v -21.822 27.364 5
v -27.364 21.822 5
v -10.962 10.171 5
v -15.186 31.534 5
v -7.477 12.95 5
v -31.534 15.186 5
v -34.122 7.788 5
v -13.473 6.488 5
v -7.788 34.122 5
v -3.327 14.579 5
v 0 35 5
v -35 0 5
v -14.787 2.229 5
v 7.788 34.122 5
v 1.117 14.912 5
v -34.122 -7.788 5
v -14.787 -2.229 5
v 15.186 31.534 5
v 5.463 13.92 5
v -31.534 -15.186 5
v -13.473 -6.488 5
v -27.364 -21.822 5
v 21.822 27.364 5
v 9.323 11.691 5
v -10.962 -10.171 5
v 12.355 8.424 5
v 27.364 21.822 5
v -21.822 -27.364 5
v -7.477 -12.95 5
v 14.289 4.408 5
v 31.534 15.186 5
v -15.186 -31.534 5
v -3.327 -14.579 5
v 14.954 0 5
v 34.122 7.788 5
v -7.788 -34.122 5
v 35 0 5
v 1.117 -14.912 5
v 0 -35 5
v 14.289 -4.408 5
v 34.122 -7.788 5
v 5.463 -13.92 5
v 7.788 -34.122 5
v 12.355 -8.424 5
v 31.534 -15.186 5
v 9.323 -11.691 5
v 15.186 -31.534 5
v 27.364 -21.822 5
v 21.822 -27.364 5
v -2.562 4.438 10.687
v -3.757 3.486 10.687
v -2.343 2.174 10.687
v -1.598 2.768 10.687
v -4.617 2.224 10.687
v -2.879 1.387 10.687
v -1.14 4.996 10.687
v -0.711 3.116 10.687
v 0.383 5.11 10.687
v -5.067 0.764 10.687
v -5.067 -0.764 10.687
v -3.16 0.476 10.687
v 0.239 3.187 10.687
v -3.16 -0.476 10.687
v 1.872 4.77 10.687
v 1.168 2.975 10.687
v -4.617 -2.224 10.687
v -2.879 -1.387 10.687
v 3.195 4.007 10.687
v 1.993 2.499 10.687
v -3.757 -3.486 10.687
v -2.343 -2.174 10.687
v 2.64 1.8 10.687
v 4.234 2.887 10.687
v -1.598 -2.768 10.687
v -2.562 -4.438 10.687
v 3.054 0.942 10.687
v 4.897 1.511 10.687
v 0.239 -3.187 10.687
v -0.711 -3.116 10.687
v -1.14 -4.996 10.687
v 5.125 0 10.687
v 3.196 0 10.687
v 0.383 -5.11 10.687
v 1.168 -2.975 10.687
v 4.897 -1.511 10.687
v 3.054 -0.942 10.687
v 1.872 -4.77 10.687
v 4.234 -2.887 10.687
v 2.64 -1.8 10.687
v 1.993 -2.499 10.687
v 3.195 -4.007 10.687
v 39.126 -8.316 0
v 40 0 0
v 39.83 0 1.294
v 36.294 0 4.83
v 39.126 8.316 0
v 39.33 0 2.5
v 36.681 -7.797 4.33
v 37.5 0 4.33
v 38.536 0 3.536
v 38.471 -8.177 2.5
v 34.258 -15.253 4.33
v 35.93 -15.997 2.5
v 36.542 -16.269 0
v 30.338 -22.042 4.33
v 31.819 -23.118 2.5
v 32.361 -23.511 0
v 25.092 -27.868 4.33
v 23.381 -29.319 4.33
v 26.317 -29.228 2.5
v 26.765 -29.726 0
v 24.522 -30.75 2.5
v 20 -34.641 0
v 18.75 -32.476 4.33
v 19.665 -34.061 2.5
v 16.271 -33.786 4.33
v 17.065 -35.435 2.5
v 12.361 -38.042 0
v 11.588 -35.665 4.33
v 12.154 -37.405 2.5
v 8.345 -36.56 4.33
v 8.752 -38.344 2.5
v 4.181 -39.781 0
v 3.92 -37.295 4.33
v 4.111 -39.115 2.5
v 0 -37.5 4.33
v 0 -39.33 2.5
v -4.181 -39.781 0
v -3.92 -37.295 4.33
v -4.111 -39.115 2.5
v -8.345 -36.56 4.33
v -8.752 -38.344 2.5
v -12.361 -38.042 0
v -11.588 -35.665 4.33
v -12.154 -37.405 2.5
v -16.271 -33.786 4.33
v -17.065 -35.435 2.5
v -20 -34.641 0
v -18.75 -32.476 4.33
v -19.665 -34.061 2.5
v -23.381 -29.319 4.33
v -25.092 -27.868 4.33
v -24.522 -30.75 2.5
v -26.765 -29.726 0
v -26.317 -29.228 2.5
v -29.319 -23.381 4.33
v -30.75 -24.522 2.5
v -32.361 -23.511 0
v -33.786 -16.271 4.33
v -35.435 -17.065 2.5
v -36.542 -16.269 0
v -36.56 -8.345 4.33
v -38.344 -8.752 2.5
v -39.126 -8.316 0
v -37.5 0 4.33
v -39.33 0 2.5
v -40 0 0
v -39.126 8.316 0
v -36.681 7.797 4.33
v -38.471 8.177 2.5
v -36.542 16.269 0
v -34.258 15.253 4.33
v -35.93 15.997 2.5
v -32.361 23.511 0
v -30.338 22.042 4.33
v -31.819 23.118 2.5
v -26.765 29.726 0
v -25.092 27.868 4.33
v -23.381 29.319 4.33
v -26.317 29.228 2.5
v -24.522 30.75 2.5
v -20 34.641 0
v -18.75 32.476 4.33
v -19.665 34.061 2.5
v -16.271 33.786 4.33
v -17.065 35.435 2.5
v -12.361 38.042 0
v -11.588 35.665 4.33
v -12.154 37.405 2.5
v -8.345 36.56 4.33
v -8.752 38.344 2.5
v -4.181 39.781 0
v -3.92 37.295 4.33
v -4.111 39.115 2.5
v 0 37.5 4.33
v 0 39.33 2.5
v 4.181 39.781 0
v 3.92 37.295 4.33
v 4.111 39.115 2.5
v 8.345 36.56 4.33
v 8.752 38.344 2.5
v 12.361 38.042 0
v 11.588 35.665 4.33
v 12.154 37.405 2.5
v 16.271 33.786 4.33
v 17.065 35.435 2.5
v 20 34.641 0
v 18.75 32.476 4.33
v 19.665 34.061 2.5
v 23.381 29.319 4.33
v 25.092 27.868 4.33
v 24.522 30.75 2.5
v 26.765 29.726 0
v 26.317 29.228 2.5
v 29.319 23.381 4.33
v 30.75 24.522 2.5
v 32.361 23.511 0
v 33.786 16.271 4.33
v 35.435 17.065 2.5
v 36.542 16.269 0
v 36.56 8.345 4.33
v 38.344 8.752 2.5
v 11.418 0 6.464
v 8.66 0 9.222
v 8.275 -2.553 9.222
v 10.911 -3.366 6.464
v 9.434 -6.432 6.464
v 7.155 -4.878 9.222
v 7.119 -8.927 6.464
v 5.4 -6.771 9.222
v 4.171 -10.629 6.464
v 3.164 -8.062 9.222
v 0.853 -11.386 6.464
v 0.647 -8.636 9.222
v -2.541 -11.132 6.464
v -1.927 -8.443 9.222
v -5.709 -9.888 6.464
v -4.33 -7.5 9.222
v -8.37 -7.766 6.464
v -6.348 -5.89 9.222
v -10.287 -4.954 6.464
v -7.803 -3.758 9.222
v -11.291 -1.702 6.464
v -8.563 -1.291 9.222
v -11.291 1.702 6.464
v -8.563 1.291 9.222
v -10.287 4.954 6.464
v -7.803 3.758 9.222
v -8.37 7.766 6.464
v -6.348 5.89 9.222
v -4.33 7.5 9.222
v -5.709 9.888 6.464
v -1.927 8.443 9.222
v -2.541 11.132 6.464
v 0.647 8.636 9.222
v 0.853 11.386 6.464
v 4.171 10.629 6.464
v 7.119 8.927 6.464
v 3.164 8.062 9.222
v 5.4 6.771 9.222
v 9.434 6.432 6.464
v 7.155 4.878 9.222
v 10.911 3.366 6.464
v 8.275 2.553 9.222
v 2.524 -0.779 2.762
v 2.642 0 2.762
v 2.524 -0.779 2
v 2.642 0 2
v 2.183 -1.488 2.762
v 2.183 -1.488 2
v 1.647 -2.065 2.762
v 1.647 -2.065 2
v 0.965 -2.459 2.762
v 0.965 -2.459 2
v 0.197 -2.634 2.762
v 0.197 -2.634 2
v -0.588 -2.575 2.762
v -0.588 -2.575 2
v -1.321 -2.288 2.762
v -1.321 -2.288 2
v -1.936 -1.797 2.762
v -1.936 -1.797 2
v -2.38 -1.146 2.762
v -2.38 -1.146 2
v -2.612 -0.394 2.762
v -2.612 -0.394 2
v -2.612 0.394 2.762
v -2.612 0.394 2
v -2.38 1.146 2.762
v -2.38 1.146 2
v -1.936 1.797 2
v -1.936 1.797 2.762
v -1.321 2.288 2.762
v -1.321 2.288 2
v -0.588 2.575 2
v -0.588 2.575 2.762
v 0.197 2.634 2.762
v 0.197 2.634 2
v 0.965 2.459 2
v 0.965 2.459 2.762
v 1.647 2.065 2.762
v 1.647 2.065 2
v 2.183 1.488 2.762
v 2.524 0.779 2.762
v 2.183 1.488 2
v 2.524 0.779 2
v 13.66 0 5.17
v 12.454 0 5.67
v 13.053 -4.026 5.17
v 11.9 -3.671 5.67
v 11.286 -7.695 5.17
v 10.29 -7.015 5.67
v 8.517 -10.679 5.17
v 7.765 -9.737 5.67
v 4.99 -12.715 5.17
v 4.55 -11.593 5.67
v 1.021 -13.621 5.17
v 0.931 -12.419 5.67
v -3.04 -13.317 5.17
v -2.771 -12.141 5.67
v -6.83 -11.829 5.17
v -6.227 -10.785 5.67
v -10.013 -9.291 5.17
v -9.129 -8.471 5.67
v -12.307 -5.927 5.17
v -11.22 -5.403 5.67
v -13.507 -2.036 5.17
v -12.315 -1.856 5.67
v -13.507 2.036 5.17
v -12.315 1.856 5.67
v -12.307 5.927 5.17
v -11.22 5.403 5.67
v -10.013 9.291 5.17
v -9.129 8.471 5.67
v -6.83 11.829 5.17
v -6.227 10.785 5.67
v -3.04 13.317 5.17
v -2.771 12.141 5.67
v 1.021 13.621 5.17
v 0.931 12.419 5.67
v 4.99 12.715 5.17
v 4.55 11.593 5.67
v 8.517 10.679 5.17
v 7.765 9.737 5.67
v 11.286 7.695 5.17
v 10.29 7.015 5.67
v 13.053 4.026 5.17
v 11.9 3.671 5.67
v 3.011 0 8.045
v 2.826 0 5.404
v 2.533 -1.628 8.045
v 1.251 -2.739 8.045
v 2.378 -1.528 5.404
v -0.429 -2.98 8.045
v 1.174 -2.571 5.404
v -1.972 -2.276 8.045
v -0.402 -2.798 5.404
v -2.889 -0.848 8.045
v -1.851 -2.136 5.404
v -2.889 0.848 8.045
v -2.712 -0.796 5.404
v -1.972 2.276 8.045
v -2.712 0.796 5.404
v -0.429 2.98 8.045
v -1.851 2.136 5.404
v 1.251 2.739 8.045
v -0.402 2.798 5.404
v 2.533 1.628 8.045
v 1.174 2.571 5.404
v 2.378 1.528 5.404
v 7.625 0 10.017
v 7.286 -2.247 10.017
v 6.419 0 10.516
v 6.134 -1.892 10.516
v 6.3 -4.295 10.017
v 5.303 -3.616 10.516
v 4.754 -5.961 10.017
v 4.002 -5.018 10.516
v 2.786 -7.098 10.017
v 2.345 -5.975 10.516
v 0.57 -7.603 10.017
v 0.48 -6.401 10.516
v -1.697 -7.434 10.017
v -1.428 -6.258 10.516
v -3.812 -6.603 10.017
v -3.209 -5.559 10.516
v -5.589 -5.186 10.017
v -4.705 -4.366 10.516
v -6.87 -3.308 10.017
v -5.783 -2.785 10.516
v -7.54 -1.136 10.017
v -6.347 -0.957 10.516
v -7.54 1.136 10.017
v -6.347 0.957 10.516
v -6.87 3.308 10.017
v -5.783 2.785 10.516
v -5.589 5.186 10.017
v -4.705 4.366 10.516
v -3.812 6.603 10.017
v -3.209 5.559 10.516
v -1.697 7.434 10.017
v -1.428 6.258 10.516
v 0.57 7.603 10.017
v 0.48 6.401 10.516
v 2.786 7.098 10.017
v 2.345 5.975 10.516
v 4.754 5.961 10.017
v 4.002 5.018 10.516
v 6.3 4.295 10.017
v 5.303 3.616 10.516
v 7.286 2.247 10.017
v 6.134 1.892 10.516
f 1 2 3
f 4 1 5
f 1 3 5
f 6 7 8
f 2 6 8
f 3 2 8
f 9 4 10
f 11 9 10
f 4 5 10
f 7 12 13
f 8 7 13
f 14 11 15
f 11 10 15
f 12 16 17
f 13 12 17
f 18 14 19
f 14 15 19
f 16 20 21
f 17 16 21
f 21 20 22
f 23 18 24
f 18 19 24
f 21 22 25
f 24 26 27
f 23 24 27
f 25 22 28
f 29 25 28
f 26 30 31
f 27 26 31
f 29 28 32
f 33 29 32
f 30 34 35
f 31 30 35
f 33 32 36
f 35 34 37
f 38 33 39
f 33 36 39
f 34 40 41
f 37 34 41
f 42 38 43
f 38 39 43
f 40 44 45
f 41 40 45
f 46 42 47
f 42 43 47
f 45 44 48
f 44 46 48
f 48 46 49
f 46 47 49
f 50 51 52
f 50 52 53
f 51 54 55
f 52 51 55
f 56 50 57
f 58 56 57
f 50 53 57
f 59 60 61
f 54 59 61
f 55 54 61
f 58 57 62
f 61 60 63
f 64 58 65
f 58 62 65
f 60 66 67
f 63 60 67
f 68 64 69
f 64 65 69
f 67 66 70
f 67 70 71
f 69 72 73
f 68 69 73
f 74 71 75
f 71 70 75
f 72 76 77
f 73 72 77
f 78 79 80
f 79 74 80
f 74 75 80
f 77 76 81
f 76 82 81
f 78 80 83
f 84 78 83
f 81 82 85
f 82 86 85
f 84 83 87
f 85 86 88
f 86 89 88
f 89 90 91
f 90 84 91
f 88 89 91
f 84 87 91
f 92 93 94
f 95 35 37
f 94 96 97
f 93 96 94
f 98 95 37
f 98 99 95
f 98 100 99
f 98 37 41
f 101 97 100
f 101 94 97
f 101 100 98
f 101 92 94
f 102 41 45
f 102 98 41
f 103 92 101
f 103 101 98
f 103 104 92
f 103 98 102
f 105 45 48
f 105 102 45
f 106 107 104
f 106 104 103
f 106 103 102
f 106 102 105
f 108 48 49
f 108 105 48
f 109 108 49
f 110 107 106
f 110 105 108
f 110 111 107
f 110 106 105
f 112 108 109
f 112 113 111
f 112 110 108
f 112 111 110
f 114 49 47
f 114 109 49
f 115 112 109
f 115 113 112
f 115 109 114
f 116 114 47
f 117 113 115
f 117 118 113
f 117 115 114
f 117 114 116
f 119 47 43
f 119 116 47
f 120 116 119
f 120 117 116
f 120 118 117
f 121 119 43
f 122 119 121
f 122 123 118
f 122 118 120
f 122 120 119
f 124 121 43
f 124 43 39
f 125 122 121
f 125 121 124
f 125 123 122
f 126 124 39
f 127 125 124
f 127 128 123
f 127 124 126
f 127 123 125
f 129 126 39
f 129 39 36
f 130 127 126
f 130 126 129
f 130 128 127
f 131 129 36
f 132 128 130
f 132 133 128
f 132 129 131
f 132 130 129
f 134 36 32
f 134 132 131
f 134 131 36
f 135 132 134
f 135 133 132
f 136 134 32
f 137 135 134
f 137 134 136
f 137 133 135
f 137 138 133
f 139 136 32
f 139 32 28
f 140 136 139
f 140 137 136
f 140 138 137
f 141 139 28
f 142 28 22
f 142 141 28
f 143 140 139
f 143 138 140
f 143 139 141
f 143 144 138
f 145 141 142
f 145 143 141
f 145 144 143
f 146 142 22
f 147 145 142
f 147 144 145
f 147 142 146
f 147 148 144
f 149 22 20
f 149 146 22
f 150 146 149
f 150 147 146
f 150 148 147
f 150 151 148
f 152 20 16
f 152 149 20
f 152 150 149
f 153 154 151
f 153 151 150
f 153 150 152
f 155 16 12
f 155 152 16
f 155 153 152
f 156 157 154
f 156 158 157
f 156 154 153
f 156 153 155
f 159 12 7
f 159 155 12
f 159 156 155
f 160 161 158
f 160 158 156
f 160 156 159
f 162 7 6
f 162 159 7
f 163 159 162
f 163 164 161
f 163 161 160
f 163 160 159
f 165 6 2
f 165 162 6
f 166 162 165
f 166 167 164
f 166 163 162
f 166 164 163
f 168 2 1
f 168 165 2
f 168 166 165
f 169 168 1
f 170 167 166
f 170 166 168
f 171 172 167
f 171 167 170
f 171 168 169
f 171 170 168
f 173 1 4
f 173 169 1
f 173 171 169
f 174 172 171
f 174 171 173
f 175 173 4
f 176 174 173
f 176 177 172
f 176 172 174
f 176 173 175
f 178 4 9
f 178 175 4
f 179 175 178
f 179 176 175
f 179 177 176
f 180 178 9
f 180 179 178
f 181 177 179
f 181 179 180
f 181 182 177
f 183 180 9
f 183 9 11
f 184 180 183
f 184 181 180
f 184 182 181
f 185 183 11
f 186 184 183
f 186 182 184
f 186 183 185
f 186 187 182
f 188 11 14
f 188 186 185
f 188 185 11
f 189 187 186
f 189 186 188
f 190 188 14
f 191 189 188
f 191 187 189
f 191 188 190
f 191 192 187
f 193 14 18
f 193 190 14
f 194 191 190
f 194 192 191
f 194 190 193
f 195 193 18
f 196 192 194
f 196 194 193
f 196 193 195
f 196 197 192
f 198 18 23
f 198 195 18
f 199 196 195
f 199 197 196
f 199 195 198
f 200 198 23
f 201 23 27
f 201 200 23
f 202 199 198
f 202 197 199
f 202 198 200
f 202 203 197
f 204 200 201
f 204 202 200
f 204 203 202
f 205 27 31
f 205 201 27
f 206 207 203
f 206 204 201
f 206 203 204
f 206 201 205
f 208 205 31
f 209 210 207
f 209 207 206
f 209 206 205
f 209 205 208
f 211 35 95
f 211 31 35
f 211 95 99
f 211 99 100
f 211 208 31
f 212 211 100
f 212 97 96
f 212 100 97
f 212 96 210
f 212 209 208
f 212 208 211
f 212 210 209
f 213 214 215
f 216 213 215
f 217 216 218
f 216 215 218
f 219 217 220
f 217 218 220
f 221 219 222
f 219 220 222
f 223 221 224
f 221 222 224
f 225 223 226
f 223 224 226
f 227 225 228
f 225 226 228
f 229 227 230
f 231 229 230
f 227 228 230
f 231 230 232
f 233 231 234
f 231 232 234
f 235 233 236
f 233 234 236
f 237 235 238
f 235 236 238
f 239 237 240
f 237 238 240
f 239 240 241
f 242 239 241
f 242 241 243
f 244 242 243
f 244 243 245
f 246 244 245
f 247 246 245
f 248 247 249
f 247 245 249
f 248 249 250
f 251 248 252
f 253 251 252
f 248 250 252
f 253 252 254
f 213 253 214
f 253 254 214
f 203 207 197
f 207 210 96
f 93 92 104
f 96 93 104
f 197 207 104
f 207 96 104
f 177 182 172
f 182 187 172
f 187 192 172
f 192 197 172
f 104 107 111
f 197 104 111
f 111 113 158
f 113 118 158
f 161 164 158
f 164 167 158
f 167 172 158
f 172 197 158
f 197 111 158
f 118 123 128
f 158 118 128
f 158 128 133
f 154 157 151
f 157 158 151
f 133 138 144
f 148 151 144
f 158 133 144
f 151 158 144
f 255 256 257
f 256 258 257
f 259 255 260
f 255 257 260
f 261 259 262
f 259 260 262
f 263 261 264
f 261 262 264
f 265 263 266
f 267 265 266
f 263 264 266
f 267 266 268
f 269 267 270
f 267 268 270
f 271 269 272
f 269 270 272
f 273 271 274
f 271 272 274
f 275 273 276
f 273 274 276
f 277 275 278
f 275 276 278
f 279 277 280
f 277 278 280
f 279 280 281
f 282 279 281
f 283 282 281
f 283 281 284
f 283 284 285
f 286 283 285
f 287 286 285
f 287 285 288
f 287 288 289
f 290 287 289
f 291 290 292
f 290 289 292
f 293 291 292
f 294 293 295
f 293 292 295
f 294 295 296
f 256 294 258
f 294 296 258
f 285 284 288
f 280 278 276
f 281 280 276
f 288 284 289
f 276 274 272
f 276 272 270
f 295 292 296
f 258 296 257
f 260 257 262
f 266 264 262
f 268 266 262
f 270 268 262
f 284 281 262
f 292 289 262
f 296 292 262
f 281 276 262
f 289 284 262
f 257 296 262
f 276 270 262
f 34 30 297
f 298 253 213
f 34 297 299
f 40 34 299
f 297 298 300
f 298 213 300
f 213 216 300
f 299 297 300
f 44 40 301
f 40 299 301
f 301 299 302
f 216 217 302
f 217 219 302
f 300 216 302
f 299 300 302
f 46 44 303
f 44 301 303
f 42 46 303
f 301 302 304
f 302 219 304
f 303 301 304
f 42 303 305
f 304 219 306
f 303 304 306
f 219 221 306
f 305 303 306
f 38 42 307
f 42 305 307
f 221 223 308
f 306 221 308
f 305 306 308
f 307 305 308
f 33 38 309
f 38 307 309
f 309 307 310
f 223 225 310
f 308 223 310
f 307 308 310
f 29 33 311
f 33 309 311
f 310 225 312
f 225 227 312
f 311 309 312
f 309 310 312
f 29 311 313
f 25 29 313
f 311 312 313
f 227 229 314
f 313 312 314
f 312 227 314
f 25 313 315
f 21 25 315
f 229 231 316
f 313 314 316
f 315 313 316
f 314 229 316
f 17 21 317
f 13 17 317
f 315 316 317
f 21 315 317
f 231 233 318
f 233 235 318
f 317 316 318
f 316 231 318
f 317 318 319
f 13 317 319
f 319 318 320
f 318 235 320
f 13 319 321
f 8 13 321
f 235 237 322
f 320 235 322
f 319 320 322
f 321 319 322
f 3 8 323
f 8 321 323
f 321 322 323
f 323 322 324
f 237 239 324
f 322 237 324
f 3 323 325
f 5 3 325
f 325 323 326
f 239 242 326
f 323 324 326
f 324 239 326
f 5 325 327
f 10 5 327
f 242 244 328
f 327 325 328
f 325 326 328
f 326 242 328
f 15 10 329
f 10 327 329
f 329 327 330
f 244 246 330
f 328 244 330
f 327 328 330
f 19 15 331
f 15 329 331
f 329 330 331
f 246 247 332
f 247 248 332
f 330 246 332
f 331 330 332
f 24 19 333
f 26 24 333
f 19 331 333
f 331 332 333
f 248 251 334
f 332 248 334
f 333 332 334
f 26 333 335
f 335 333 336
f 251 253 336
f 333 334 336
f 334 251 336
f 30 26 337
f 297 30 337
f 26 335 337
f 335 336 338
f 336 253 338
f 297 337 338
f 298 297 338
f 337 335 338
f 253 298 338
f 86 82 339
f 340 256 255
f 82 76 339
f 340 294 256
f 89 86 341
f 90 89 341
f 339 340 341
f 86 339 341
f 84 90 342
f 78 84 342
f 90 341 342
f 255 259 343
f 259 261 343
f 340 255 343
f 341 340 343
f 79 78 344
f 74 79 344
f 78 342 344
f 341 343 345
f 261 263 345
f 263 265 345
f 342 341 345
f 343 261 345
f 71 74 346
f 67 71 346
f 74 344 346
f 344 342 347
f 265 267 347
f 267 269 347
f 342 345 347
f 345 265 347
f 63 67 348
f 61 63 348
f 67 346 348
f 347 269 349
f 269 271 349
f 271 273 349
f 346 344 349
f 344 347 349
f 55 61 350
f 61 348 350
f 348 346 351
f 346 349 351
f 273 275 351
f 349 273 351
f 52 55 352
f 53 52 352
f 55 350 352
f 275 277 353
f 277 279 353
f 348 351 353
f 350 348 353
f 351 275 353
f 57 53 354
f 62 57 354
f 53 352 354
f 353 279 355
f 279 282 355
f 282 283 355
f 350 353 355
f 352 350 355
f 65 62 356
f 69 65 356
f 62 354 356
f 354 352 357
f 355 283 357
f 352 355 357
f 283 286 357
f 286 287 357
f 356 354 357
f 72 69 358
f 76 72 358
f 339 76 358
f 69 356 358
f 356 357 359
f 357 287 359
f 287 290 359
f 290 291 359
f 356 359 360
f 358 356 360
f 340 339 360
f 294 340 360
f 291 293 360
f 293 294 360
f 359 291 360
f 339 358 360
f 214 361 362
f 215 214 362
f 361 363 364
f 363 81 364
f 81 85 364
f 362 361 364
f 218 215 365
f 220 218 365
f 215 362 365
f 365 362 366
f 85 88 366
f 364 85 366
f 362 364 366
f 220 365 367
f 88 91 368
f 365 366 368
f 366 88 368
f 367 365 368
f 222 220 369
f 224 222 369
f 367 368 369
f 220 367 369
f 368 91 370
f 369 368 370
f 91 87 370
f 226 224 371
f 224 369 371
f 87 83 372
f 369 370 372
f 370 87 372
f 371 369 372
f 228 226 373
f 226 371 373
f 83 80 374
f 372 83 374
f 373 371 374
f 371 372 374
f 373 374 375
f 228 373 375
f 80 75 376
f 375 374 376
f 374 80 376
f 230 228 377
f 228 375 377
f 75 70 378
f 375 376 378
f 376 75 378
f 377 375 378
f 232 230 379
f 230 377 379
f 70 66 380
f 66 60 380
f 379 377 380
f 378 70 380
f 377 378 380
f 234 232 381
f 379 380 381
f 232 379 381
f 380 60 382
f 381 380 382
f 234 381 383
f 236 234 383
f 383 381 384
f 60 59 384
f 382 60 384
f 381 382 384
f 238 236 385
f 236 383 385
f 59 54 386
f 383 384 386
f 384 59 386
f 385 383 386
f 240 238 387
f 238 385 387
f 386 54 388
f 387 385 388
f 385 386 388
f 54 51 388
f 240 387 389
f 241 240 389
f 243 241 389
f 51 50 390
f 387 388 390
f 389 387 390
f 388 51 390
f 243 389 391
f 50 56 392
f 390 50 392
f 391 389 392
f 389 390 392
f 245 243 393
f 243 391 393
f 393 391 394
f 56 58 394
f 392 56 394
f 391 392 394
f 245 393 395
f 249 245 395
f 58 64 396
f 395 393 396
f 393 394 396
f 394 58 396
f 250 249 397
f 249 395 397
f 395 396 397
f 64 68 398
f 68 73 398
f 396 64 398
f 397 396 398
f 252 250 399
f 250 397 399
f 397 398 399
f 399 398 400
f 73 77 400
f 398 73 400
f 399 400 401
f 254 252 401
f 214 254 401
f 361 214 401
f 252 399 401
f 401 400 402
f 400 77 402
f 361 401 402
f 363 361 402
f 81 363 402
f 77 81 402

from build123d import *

# Parameters (mm, degrees)
F2_R = 4.99999


# Not quite as in the source:
# - a fillet or chamfer is up to 0.001 mm smaller than in the source, because OpenCascade refuses the exact size


with BuildPart() as f1:
    # F0 (on Front) → F1 (revolve)
    with BuildSketch(Plane.XZ):
        Polygon((40, 5), (12.8825559993, 5), (7.1957559993, 10.6868), (3.1957559993, 10.6868), (2.6416, 2.762), (2.6416, 2), (0, 2), (0, 0), (40, 0), align=None)
    revolve(axis=Axis((0, 0, -11.1281685531), (0, 0, -1)))

    # F2 (radius 5 in the source; OpenCascade refuses exactly that, so slightly less here)
    f2_edges = [f1.edges().sort_by_distance(p)[0] for p in [
        (-12.882556, 0, 5),
        (-40, 0, 5),
        (-7.195756, 0, 10.6868),
    ]]
    fillet(f2_edges, radius=F2_R)


solid = f1.part
